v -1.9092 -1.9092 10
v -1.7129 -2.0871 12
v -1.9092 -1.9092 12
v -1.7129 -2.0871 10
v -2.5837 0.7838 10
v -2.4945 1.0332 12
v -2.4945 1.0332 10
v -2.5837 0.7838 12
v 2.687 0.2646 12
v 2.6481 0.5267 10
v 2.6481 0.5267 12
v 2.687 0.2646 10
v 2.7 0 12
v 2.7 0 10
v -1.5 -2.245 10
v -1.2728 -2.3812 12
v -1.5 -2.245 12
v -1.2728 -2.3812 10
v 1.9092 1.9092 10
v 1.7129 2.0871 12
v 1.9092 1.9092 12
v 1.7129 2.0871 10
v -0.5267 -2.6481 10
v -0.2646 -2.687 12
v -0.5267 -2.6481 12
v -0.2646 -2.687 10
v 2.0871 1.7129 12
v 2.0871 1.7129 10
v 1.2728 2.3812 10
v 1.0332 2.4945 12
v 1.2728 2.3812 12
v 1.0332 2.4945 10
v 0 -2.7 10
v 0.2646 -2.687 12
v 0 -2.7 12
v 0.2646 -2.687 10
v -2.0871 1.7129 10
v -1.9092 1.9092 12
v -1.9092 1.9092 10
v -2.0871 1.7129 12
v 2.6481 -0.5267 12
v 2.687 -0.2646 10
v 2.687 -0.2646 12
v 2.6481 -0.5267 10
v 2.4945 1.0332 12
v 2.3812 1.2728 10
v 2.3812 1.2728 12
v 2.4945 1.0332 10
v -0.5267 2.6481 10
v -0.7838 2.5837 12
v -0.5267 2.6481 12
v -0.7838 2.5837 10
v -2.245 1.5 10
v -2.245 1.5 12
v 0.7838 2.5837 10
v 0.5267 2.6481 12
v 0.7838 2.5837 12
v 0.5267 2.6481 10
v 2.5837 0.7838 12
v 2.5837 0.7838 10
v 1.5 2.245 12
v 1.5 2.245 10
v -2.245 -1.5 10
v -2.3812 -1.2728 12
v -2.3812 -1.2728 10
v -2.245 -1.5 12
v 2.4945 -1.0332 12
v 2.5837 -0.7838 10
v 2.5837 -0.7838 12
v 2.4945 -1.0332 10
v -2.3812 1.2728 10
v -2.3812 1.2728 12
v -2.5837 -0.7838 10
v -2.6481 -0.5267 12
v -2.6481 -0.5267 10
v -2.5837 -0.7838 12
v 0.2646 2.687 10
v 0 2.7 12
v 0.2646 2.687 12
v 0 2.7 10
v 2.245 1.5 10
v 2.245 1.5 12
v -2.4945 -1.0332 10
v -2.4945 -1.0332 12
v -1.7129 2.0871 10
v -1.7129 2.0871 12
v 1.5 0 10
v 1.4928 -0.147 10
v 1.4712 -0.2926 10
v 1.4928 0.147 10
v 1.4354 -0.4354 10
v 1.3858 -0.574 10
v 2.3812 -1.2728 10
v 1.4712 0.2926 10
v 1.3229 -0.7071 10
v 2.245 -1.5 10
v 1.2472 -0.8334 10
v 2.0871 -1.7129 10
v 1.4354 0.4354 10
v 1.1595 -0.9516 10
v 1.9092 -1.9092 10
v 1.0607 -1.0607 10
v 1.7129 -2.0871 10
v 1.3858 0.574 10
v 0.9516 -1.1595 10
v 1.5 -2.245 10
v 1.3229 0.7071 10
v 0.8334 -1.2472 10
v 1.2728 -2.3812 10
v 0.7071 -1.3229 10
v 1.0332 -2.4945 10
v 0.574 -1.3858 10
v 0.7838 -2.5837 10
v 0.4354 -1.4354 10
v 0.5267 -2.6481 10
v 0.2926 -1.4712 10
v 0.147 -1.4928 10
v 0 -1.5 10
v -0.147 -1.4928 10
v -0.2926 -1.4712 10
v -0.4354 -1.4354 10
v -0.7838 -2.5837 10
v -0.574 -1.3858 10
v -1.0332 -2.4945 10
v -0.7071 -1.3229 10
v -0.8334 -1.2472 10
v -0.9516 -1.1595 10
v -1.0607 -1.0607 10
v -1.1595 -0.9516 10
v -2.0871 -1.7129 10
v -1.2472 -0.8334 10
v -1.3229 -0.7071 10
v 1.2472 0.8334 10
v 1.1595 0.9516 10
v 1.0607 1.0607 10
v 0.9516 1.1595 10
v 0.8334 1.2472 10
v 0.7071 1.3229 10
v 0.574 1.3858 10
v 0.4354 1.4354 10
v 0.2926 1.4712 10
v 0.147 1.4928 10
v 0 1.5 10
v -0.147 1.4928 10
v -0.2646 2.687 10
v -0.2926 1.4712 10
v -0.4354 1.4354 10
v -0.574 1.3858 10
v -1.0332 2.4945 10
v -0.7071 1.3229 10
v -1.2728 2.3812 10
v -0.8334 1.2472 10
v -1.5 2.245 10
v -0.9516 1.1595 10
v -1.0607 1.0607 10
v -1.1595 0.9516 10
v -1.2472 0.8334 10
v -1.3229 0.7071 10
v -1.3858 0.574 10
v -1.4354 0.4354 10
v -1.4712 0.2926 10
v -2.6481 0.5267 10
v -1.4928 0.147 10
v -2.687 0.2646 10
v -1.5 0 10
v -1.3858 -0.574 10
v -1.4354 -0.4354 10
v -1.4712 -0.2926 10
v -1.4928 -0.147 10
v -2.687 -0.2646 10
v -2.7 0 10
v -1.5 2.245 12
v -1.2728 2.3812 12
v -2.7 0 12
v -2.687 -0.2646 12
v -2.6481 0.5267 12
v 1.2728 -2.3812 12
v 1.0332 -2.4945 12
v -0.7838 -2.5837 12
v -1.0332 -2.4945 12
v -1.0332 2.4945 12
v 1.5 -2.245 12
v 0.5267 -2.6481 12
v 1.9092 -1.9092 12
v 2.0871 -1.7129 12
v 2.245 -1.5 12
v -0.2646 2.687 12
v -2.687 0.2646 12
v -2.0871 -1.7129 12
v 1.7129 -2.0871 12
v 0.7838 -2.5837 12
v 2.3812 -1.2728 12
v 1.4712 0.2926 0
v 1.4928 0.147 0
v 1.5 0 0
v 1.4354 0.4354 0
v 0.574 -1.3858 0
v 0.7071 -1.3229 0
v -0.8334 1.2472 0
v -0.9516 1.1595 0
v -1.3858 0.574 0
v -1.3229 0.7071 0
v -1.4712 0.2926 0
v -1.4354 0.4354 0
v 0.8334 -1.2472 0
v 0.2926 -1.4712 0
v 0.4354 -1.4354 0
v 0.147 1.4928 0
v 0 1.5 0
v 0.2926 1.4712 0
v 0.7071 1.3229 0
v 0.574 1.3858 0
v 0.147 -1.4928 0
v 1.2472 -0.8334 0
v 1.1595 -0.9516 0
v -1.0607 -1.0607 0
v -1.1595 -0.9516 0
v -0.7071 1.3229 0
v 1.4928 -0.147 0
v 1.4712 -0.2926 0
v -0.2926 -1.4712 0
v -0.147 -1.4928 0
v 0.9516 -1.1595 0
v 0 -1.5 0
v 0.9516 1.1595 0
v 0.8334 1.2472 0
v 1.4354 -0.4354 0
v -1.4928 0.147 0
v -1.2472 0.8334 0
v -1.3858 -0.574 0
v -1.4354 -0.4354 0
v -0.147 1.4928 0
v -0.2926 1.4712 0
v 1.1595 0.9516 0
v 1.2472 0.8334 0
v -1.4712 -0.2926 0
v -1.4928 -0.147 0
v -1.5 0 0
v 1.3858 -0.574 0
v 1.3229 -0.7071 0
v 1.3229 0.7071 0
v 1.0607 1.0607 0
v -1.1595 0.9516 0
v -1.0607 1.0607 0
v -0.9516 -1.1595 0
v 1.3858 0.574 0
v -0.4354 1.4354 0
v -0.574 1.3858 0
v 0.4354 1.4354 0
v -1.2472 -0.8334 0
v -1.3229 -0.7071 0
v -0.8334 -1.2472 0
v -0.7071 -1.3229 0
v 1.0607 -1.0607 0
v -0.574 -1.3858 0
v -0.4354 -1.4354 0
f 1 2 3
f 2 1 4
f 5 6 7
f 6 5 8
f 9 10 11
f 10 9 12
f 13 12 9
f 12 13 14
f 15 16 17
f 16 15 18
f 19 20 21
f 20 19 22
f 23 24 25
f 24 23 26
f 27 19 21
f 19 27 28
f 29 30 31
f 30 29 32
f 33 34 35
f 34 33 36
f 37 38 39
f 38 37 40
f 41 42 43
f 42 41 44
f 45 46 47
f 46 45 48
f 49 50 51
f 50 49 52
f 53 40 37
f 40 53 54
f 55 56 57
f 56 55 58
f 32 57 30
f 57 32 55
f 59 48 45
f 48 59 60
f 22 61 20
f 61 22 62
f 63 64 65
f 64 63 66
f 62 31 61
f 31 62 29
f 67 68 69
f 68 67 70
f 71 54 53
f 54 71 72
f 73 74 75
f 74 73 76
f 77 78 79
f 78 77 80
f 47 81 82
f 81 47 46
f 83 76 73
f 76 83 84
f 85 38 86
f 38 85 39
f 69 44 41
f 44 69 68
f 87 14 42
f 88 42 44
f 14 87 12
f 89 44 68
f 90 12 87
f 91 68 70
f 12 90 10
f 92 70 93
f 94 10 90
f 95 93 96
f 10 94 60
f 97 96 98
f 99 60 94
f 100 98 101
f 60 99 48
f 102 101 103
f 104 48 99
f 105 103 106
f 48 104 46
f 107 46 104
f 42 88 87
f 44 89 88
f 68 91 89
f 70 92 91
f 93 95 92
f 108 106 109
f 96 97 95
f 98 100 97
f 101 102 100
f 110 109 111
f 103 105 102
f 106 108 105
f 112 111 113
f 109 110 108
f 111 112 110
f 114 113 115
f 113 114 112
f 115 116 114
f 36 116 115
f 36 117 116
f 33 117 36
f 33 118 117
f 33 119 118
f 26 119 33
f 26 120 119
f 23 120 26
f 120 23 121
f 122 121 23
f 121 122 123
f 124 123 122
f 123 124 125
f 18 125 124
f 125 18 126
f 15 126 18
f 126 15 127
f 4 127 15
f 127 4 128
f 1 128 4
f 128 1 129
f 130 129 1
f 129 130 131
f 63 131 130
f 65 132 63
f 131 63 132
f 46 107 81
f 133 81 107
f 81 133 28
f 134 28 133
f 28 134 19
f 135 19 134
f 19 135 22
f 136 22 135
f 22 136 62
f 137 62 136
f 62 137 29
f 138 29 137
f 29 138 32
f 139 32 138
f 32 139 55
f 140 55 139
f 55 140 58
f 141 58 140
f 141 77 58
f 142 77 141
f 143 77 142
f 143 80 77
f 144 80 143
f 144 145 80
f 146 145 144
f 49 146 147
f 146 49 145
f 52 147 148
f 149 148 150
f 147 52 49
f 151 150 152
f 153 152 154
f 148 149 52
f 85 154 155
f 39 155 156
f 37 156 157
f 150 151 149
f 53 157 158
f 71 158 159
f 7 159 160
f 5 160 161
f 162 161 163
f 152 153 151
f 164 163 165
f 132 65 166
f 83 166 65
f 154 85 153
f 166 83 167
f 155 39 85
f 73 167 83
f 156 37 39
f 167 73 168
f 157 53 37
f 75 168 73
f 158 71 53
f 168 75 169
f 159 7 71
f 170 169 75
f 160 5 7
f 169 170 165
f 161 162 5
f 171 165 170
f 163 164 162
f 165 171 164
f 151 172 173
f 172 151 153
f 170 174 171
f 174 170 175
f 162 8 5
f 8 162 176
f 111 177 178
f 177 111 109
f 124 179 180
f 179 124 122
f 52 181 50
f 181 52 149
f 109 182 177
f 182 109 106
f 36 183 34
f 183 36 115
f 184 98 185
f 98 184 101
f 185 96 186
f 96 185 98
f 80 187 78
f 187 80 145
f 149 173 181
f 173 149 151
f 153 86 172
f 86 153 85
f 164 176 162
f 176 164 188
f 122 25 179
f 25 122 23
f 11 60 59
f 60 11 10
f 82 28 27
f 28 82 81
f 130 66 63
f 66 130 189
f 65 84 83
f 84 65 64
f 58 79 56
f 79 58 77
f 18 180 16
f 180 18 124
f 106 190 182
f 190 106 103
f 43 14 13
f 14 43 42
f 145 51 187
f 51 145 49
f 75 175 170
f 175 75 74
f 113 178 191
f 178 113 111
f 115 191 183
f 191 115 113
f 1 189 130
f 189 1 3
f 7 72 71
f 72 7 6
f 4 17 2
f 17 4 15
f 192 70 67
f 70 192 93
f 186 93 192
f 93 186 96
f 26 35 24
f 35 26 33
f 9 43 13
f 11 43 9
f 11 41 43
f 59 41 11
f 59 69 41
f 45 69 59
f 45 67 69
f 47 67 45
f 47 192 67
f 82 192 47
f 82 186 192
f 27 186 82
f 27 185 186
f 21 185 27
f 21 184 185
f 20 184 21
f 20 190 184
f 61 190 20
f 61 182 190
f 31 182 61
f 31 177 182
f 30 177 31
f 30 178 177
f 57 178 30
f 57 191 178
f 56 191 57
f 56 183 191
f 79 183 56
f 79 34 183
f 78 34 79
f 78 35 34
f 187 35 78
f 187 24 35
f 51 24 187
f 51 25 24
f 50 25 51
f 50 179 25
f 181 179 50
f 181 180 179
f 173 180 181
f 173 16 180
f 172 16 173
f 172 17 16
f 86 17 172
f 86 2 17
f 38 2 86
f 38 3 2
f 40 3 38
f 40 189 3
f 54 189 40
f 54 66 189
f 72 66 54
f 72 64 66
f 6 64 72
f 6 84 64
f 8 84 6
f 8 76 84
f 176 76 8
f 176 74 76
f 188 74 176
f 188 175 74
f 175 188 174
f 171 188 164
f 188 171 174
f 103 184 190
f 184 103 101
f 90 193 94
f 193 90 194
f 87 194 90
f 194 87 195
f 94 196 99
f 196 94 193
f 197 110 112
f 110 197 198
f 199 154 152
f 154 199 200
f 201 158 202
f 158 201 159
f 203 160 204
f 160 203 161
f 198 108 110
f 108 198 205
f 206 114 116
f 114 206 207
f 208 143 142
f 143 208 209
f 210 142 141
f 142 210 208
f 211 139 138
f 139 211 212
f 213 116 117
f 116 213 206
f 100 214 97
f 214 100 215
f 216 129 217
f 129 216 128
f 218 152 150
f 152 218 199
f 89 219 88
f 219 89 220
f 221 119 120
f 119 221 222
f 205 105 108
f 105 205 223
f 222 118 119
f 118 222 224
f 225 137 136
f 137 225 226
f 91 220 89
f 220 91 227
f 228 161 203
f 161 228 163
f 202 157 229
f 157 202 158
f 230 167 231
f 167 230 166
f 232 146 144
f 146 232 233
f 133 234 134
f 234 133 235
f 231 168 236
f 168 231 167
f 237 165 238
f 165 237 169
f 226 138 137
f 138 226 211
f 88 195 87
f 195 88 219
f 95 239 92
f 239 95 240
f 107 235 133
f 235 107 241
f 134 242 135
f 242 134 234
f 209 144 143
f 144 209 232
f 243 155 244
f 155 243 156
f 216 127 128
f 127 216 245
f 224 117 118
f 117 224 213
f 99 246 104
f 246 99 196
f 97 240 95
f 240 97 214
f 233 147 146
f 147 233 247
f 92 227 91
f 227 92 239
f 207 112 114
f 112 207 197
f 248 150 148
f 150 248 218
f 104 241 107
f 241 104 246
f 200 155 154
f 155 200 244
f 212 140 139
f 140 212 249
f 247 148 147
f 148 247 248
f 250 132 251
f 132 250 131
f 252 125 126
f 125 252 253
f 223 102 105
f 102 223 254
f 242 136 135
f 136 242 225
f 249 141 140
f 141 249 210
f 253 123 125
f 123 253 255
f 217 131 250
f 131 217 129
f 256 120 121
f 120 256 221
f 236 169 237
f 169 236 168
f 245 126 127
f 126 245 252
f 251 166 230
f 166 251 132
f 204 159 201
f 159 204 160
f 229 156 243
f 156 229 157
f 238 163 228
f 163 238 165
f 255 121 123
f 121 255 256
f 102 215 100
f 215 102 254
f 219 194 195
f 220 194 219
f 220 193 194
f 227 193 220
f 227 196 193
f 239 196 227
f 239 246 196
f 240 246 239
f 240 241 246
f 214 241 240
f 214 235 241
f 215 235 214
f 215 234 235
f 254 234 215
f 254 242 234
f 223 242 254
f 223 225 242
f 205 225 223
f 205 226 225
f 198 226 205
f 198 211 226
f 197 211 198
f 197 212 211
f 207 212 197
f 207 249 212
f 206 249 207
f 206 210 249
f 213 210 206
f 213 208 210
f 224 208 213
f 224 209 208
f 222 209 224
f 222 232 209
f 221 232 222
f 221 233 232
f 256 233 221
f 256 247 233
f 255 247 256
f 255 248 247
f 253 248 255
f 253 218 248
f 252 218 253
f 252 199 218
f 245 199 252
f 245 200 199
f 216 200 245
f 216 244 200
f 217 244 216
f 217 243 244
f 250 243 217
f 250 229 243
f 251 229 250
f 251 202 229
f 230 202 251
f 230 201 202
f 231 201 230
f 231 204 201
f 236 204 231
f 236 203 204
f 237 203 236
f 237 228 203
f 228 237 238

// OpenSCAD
module pan_head_screw() {
    union() {
        // Screw head
        translate([0, 0, 10])
            cylinder(h=2.0, d=5.4, $fn=64);
        
        // Screw shaft
        cylinder(h=10, d=3.0, $fn=64);
    }
}

pan_head_screw();
